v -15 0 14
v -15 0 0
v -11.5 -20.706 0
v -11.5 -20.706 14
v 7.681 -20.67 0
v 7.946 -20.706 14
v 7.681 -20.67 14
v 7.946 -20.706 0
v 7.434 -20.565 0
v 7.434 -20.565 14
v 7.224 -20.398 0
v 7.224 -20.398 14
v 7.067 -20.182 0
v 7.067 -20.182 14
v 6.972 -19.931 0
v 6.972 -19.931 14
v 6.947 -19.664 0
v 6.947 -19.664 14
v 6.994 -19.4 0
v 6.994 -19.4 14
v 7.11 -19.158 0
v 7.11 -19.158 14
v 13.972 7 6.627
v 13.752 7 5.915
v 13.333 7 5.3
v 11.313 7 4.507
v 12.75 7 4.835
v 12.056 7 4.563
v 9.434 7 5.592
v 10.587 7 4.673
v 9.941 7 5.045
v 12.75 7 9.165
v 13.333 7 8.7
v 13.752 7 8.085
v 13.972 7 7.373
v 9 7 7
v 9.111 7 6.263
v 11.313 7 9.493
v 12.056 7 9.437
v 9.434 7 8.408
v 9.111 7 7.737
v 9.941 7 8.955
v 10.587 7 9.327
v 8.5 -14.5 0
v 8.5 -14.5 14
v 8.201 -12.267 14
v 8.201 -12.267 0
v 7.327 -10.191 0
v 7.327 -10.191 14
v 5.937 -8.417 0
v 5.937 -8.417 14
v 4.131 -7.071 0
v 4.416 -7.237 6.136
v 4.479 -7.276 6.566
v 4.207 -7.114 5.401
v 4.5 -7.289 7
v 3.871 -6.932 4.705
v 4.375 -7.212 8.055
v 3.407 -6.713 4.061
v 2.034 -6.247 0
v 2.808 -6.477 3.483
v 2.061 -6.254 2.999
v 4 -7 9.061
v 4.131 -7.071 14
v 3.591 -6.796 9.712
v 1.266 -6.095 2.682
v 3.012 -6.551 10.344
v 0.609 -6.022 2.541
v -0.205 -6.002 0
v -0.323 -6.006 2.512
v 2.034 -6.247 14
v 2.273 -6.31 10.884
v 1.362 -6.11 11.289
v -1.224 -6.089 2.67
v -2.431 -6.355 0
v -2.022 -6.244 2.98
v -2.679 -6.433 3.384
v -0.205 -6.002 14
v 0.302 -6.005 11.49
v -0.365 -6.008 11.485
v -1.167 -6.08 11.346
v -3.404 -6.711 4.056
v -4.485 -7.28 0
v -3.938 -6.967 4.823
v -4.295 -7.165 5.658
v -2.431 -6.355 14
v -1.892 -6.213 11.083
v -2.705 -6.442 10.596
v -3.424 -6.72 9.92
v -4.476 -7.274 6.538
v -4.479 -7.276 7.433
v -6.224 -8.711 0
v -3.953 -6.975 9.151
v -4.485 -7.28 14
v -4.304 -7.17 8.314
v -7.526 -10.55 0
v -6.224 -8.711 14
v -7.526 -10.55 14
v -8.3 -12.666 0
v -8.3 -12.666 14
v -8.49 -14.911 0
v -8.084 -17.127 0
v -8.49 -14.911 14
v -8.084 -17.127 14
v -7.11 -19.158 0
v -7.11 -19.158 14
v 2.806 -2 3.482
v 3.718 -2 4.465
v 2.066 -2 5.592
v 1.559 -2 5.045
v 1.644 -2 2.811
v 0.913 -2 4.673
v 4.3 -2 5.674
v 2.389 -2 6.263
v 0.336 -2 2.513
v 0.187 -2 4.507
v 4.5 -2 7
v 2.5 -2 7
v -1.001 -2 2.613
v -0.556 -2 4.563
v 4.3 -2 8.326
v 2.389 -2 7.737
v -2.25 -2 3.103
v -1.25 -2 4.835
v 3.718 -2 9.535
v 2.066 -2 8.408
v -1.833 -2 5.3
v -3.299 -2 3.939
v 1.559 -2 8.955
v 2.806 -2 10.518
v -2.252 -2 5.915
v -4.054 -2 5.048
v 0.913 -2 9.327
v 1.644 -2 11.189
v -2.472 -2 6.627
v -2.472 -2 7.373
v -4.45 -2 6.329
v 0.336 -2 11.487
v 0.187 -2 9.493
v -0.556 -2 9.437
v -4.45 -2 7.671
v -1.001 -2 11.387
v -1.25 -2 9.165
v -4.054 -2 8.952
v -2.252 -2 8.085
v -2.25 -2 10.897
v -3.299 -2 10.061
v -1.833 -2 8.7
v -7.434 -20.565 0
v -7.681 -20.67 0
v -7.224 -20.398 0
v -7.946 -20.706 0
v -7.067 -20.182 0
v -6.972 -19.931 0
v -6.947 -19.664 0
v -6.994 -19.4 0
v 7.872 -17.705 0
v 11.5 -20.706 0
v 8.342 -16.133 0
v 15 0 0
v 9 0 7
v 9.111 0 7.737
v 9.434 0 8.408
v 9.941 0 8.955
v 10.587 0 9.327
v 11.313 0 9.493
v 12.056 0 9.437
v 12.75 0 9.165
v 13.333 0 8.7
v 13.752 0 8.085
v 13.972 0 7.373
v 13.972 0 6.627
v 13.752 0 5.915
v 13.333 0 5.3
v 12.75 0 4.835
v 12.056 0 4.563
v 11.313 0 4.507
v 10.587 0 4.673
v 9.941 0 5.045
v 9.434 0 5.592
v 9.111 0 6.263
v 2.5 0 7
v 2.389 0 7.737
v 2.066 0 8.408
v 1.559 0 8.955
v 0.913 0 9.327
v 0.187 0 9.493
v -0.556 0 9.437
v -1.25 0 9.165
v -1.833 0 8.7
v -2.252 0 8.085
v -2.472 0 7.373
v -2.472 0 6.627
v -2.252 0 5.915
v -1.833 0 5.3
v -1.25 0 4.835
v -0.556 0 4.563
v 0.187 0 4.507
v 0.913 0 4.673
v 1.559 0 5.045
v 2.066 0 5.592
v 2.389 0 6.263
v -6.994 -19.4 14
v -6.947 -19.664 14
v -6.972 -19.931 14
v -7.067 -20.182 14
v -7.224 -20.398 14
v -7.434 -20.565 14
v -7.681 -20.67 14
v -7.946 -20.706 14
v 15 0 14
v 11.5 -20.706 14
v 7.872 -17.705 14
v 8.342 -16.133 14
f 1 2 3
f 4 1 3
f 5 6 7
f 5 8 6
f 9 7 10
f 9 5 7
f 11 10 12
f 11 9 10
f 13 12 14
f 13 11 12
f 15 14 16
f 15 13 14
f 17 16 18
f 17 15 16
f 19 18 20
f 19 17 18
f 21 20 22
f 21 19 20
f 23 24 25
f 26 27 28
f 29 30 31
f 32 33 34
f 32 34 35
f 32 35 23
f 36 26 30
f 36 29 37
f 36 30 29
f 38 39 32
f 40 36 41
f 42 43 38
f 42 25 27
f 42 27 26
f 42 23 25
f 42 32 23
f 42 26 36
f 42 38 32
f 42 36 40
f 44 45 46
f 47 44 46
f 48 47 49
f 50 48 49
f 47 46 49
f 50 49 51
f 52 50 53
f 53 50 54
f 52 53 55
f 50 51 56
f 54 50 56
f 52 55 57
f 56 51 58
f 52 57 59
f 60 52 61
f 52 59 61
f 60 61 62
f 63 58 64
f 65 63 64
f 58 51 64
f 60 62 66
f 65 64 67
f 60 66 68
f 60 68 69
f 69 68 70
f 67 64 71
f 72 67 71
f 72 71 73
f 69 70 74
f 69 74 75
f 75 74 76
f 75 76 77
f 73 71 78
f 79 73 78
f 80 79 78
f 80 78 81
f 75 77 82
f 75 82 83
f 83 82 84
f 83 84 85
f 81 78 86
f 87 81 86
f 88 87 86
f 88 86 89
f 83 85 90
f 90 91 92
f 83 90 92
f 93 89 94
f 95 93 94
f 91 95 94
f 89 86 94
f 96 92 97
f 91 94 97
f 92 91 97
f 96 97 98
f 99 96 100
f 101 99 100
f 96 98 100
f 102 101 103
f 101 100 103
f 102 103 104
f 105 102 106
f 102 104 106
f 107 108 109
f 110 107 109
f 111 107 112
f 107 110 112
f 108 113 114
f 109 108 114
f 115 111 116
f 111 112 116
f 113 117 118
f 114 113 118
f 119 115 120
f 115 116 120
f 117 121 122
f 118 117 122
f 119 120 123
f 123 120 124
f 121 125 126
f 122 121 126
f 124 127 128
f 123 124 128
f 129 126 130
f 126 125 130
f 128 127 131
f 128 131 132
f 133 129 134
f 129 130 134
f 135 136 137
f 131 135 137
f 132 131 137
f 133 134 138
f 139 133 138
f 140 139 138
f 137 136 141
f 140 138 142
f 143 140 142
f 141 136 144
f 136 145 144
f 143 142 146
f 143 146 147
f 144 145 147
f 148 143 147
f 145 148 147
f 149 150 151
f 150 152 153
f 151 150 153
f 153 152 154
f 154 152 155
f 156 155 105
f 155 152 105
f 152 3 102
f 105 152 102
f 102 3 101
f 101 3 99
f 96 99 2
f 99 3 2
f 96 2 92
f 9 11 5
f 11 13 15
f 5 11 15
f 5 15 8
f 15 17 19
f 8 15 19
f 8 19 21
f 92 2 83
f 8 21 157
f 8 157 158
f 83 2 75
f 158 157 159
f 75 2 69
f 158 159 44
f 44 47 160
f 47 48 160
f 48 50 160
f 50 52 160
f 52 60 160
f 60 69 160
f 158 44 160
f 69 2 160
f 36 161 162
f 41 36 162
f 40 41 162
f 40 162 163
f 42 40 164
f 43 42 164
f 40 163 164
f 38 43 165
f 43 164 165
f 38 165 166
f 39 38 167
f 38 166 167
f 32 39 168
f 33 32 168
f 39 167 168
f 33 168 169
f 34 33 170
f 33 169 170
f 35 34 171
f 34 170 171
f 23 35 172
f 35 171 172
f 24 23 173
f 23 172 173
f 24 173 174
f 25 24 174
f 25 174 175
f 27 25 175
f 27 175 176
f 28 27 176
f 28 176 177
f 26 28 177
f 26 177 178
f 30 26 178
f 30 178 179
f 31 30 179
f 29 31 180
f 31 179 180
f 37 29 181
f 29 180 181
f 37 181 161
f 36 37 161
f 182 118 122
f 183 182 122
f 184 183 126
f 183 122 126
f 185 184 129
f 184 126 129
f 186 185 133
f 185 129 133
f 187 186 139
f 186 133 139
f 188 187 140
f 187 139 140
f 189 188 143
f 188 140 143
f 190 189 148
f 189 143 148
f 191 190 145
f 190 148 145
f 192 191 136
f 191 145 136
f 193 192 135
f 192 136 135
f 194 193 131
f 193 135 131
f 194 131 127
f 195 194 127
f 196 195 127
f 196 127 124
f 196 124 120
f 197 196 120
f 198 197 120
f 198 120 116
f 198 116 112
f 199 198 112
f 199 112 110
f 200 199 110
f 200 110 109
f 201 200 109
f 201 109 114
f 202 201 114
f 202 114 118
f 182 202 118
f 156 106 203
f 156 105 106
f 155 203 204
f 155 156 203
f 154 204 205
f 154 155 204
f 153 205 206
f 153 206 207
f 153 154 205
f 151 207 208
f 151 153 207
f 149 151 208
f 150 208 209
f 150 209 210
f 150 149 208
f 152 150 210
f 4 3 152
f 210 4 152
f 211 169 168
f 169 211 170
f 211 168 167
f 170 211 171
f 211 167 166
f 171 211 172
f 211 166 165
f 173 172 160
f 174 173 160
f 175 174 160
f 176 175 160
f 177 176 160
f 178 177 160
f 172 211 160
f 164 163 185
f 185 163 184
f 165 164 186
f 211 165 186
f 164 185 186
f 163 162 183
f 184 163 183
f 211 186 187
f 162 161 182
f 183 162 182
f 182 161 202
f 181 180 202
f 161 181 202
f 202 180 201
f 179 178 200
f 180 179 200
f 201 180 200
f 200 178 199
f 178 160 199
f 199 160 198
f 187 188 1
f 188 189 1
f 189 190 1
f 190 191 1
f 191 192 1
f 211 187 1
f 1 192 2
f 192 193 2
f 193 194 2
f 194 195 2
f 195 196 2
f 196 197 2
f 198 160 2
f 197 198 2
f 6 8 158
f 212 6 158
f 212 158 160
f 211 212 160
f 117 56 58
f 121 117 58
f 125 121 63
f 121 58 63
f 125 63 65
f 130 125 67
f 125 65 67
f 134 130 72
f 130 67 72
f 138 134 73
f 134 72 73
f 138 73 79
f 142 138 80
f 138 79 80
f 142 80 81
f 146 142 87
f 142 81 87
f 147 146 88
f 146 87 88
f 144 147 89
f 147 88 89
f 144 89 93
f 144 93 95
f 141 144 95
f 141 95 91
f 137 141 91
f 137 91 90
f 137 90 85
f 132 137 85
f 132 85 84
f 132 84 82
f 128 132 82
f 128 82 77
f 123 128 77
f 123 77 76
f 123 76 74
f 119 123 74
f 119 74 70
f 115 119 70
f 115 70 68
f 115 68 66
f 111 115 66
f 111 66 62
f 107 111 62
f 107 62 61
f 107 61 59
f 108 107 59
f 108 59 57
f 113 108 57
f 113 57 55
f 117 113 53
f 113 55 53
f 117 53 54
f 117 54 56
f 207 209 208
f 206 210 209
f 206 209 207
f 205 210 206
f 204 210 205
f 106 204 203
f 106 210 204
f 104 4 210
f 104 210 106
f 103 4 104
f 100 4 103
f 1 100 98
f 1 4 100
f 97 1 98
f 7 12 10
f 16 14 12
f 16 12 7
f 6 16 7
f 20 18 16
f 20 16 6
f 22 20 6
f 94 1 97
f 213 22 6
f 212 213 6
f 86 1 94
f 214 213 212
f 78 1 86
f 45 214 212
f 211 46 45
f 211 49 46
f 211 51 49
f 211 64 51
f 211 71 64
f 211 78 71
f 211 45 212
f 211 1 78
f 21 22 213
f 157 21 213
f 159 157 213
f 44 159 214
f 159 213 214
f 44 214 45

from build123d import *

# Parameters (mm, degrees)
F1_DEPTH  = 14
F3_D      = 9
F5_DEPTH  = 25
F6_R      = 5.1010545076
F7_DEPTH  = 2
F9_D      = 5
F10_R     = 1
F8_R      = 2.5
F11_DEPTH = 7


with BuildPart() as f1:
    # F0 (on Top) → F1 (new body)
    with BuildSketch(Plane.XY):
        Polygon((15, 0), (-15, 0), (-11.5, -20.7062792408), (11.5, -20.7062792408), align=None)
    extrude(amount=F1_DEPTH)

    # F3 (through all)
    with Locations(Plane(origin=(0, 0, 0), x_dir=(-1, 0, 0), z_dir=(0, 1, 0))):
        with Locations((0, 7)):
            Hole(F3_D / 2)

    # F4 (on face) → F5 (cut)
    with BuildSketch(Plane.XY.offset(14)):
        with BuildLine():
            ThreePointArc((5.8079340548, -20.7062792408), (7.7979945969, -17.8824961592), (8.5, -14.5))
            ThreePointArc((8.5, -14.5), (-3.3824961592, -6.7020054031), (-5.8079340548, -20.7062792408))
            Line((-5.8079340548, -20.7062792408), (5.8079340548, -20.7062792408))
        make_face()
    extrude(amount=-F5_DEPTH, mode=Mode.SUBTRACT)

    # F6 (on face) → F7 (join)
    with BuildSketch(Plane(origin=(0, 0, 0), x_dir=(-1, 0, 0), z_dir=(0, 1, 0))):
        with Locations((0, 7)):
            Circle(F6_R)
    extrude(amount=-F7_DEPTH)

    # F9 (through all)
    with Locations(Plane(origin=(0, 0, 0), x_dir=(-1, 0, 0), z_dir=(0, 1, 0))):
        with Locations((0, 7)):
            Hole(F9_D / 2)

    # F10
    f10_edges = [f1.edges().sort_by_distance(p)[0] for p in [
        (-5.807934, -20.706279, 7),
        (5.807934, -20.706279, 7),
    ]]
    fillet(f10_edges, radius=F10_R)

    # F8 (on face) → F11 (join)
    with BuildSketch(Plane(origin=(0, 0, 0), x_dir=(-1, 0, 0), z_dir=(0, 1, 0))):
        with Locations((-11.5, 7)):
            Circle(F8_R)
    extrude(amount=F11_DEPTH)


solid = f1.part
